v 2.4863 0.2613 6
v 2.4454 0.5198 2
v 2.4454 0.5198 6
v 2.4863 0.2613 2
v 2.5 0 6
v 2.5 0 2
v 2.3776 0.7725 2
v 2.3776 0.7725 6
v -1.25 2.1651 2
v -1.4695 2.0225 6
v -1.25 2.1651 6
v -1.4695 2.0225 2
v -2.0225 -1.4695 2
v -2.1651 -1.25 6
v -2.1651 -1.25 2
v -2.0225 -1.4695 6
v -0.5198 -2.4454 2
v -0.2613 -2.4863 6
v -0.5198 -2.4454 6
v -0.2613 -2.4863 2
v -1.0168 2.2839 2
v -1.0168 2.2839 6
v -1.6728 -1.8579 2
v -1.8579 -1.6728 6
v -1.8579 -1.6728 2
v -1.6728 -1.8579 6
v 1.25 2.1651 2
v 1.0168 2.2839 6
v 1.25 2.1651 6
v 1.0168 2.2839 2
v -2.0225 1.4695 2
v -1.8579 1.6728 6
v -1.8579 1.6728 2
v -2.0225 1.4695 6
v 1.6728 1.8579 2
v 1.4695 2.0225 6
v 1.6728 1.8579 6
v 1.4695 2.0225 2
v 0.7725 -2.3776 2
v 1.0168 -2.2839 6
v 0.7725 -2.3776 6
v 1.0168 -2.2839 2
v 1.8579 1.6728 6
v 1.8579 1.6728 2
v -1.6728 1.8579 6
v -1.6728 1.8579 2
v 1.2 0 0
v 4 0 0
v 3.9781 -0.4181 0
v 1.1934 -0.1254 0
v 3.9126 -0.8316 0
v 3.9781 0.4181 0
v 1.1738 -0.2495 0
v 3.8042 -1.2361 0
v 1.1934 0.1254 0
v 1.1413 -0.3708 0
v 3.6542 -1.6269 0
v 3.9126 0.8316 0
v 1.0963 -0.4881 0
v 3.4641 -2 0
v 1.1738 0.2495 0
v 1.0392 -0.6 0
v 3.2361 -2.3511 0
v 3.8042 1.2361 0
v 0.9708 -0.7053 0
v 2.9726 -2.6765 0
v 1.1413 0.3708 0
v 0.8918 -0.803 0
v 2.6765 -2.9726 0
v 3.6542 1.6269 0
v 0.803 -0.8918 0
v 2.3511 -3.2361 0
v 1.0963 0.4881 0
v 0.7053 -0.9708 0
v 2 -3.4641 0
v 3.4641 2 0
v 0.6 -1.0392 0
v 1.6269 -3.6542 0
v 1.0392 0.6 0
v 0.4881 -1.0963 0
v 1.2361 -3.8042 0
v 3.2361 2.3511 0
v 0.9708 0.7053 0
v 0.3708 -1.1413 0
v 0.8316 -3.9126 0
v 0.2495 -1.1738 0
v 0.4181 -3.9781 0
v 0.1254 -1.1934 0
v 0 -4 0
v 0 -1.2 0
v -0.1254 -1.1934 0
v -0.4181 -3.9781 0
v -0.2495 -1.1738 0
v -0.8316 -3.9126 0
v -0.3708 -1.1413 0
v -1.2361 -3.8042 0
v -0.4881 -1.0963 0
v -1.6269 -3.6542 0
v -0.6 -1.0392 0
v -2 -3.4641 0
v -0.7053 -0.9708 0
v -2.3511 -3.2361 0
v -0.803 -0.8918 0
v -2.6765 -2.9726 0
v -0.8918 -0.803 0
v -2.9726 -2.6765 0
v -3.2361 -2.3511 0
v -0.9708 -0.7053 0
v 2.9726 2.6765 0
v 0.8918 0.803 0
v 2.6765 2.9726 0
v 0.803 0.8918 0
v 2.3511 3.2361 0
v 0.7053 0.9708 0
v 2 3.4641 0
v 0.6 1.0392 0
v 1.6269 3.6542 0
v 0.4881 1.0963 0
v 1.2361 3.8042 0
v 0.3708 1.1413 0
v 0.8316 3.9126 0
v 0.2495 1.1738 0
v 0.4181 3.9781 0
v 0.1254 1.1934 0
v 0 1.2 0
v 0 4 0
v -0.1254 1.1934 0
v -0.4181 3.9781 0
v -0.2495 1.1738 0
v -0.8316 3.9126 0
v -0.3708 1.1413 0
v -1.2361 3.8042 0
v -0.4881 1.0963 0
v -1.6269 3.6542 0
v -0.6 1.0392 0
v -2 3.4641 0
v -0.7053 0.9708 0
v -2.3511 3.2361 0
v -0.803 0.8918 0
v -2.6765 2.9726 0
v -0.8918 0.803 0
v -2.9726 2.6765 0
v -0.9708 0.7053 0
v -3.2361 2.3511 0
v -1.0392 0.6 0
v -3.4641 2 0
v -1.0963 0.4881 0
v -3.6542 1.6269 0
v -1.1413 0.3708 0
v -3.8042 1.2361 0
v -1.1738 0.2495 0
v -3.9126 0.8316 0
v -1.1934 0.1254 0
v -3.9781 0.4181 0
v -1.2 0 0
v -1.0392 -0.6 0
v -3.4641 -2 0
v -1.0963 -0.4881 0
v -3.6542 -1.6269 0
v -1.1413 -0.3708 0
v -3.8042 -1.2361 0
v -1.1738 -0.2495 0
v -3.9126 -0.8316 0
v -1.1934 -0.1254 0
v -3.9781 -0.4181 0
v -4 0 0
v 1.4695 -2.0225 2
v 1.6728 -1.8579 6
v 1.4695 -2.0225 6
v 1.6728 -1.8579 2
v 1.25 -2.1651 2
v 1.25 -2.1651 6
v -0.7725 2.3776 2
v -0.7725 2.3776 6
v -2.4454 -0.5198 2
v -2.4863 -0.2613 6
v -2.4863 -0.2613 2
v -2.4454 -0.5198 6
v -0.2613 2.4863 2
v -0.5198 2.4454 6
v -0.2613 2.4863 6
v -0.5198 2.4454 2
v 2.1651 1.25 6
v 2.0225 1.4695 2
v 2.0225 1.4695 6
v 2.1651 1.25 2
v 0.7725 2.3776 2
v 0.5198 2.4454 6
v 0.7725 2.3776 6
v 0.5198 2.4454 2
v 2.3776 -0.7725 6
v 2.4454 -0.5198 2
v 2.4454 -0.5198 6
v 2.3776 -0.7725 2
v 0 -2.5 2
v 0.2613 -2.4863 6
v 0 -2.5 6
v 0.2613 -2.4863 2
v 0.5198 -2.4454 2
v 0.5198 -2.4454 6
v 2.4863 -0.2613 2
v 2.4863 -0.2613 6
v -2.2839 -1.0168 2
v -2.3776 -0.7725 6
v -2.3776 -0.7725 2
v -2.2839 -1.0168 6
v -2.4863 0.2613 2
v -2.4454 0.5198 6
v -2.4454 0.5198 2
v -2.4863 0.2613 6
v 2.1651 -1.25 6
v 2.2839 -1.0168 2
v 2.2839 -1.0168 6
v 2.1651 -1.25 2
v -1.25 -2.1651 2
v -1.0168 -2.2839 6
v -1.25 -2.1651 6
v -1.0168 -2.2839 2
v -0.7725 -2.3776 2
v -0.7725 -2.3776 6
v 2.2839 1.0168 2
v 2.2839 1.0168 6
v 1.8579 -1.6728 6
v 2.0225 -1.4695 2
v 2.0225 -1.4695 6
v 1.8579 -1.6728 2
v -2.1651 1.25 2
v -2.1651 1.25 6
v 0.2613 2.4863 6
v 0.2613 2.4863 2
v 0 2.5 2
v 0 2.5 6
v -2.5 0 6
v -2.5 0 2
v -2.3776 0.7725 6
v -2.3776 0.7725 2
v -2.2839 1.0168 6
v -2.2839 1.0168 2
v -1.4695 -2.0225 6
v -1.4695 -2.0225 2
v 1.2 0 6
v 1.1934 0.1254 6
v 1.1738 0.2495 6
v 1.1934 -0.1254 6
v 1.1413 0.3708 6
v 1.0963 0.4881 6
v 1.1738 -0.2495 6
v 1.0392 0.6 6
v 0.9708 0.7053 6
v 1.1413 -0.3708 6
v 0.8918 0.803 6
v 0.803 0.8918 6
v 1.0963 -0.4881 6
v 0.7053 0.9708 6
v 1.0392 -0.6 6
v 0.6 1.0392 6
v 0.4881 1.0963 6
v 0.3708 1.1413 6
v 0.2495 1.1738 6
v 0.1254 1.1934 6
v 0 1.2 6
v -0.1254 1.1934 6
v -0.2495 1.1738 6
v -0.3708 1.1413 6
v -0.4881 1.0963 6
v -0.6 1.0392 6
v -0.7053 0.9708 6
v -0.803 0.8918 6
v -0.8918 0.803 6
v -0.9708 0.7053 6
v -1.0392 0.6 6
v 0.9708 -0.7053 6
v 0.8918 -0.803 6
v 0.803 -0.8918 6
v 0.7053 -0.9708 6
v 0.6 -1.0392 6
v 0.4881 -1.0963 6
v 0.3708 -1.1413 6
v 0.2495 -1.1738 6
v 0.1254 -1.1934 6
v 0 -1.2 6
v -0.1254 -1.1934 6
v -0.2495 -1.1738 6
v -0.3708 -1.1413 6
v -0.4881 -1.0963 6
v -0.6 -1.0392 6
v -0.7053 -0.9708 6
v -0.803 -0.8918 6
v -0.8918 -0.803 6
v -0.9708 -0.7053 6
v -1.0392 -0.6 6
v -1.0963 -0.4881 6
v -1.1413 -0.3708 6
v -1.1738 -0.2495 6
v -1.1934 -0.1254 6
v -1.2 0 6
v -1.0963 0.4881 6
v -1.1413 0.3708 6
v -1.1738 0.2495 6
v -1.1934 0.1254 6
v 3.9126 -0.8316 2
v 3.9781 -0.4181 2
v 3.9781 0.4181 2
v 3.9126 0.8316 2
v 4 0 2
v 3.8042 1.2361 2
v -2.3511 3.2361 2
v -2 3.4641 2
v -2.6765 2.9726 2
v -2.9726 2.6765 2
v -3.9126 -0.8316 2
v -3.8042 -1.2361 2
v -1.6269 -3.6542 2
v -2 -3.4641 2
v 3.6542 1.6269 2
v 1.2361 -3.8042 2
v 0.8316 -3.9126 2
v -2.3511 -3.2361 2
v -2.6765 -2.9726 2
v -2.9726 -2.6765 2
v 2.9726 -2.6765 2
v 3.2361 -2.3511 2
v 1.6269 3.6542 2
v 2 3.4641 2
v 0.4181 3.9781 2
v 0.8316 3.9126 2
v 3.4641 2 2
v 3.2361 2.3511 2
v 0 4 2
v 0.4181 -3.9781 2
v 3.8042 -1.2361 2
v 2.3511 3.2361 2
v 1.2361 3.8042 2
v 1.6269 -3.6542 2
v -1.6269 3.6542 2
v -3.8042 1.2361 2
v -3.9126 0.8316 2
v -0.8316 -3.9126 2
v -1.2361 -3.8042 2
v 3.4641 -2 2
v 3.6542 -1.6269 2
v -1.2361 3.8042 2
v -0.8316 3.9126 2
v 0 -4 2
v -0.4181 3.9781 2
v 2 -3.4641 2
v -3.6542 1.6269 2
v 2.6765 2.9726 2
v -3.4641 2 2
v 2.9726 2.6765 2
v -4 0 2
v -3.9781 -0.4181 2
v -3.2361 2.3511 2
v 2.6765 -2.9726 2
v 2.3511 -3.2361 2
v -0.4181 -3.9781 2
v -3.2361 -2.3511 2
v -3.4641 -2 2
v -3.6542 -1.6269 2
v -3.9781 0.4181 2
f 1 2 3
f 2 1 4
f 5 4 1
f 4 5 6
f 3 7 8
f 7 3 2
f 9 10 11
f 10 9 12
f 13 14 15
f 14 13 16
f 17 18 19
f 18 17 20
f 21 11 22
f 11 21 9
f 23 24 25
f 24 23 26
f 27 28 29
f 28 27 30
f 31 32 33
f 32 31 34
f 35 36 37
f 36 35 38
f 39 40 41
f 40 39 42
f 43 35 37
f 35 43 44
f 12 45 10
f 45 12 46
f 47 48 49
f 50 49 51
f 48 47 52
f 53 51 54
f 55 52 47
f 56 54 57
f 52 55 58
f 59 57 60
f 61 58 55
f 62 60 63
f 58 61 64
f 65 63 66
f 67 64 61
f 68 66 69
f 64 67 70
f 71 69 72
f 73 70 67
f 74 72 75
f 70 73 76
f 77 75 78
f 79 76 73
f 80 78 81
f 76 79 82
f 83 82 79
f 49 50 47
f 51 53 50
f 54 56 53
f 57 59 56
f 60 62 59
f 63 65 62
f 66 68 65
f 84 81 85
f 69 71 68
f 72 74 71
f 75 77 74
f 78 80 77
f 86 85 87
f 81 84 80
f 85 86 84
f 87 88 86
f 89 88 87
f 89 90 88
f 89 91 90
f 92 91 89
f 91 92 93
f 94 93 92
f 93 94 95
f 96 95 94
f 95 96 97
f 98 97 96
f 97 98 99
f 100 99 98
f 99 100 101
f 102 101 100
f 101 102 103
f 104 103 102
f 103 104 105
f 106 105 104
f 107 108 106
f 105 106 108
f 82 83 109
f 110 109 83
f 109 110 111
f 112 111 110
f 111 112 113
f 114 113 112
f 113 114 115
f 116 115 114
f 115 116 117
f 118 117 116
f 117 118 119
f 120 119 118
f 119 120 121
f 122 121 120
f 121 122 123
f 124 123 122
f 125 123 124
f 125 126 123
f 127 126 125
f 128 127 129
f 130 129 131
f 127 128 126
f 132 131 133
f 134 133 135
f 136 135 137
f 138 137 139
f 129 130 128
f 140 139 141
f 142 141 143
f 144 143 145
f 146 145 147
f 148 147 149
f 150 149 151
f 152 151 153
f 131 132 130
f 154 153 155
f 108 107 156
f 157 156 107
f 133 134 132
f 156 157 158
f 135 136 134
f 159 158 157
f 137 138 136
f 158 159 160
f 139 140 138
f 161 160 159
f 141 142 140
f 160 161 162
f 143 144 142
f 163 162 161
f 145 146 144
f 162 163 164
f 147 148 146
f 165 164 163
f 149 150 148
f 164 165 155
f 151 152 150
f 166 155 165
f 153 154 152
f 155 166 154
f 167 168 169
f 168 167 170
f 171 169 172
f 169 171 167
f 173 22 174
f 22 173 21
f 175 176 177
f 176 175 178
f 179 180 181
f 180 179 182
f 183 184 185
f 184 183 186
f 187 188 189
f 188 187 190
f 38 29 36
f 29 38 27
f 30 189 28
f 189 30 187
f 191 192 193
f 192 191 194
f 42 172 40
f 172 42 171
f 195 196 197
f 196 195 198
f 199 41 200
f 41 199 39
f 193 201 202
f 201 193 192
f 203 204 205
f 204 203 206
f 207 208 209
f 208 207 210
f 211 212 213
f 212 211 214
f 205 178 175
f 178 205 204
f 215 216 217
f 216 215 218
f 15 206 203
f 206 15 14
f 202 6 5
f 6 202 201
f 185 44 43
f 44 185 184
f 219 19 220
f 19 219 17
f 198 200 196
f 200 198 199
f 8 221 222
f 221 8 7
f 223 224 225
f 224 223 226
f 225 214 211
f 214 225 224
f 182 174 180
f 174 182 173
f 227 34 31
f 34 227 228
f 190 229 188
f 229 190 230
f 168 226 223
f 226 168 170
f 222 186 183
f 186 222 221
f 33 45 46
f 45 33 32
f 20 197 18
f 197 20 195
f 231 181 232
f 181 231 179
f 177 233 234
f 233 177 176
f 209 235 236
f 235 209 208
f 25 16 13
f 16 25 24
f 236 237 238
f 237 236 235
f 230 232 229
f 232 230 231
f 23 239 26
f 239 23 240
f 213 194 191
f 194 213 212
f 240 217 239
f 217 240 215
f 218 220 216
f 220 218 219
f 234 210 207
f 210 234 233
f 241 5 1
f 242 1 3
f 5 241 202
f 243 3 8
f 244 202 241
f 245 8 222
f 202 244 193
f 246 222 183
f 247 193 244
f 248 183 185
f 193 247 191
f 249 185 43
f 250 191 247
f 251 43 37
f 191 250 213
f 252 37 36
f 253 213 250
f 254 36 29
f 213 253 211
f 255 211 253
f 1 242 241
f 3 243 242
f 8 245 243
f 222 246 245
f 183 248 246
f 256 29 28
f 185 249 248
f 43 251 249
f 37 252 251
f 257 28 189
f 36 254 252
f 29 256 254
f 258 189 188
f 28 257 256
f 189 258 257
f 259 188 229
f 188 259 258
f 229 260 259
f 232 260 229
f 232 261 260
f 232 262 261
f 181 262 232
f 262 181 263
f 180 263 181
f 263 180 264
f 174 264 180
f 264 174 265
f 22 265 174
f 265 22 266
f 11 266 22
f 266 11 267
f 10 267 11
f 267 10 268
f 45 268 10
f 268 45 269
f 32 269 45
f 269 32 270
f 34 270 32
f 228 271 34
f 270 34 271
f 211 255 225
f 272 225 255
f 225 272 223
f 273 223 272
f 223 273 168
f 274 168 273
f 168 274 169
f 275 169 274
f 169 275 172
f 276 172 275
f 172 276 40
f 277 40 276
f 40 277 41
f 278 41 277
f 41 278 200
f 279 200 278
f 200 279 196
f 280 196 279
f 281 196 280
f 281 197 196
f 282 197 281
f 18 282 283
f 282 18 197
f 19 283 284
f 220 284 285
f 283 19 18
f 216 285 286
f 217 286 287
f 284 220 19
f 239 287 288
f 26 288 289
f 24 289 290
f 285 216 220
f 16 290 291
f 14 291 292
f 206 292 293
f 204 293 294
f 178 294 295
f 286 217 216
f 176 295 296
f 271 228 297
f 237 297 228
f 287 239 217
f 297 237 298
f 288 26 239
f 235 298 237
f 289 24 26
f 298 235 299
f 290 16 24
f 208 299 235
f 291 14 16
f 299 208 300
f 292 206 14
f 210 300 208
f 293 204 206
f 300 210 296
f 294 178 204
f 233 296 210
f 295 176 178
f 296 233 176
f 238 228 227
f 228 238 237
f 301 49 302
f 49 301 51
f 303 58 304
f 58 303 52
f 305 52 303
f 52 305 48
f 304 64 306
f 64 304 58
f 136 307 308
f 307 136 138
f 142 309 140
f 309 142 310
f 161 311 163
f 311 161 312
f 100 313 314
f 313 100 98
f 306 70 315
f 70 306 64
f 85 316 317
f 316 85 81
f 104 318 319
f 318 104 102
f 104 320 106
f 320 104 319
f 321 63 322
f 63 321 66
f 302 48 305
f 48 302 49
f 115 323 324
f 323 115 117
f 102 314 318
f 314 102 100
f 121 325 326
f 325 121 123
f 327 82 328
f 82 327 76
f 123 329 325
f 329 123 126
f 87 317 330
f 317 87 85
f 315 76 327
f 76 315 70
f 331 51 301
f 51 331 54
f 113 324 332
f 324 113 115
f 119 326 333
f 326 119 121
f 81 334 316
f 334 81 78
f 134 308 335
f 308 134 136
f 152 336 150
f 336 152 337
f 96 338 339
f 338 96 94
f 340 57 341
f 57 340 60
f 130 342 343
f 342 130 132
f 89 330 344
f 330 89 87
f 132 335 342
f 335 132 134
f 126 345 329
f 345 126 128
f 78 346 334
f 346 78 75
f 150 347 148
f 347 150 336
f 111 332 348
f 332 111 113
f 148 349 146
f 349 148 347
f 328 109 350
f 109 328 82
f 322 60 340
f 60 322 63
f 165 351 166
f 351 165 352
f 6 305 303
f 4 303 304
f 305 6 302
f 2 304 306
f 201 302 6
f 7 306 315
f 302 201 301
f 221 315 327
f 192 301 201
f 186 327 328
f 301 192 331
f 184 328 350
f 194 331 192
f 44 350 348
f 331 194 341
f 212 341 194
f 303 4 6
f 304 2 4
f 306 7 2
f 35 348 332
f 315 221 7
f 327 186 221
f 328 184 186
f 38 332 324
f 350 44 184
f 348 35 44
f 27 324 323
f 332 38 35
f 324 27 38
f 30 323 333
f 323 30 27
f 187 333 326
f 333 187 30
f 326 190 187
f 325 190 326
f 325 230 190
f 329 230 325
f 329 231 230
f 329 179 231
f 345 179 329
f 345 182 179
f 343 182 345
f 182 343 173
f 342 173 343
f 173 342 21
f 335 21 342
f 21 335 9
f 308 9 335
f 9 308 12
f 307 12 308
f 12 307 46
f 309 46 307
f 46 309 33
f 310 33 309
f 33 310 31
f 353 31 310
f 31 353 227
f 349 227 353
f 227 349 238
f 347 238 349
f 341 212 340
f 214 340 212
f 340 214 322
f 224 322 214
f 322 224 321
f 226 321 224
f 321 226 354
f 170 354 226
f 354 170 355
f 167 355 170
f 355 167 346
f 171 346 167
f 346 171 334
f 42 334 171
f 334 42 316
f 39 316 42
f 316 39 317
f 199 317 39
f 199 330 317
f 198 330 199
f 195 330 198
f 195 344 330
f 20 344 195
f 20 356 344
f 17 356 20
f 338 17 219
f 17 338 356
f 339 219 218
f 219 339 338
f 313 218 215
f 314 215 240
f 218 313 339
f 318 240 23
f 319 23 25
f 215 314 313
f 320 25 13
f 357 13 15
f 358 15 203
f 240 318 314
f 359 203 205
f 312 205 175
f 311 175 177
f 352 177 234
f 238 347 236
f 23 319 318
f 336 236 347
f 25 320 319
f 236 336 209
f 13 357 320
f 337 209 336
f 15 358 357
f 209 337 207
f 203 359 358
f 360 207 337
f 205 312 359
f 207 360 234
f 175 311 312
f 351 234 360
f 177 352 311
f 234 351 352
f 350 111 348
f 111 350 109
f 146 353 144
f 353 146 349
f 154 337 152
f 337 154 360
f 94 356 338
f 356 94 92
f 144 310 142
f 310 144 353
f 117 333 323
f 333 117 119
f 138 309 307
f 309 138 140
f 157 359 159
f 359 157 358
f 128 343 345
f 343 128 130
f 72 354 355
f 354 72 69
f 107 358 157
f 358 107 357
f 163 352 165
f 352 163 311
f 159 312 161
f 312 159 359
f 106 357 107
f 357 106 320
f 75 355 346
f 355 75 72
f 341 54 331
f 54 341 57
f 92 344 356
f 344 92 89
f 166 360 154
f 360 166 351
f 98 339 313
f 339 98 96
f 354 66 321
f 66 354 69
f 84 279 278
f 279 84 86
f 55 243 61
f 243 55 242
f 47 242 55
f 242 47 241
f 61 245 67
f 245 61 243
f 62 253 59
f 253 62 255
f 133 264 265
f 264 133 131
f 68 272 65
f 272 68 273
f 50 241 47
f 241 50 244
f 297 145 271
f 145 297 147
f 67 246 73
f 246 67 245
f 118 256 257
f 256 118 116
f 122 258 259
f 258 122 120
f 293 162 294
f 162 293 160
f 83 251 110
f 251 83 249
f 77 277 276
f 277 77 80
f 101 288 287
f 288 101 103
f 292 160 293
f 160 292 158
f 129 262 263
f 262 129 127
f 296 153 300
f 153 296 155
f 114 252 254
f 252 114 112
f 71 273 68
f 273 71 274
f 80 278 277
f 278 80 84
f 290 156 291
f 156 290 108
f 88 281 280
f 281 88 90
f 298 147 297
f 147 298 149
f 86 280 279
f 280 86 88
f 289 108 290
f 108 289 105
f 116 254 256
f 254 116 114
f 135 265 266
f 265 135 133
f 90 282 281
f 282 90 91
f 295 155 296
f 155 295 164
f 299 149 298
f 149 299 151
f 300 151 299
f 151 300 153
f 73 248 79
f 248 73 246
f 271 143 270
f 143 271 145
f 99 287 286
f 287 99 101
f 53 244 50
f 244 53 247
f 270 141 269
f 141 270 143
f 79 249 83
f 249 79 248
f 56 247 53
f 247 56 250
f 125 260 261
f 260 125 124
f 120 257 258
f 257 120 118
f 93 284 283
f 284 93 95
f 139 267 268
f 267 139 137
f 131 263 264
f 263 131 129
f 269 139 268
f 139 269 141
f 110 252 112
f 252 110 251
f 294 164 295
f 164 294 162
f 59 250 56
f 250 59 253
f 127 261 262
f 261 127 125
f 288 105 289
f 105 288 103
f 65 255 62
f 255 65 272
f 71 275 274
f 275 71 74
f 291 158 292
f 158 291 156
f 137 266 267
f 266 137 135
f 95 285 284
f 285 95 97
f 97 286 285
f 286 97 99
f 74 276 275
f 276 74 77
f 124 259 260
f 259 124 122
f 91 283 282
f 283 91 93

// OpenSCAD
// Flanged threaded insert.
$fn = 60;
eps = 0.02;
inner_d = 2.4;
outer_d = 5;
length = 6;
flange_d = 8;
difference() {
    union() { cylinder(d=outer_d,h=length); cylinder(d=flange_d,h=2); }
    translate([0,0,-eps]) cylinder(d=inner_d,h=length+2*eps);
}
